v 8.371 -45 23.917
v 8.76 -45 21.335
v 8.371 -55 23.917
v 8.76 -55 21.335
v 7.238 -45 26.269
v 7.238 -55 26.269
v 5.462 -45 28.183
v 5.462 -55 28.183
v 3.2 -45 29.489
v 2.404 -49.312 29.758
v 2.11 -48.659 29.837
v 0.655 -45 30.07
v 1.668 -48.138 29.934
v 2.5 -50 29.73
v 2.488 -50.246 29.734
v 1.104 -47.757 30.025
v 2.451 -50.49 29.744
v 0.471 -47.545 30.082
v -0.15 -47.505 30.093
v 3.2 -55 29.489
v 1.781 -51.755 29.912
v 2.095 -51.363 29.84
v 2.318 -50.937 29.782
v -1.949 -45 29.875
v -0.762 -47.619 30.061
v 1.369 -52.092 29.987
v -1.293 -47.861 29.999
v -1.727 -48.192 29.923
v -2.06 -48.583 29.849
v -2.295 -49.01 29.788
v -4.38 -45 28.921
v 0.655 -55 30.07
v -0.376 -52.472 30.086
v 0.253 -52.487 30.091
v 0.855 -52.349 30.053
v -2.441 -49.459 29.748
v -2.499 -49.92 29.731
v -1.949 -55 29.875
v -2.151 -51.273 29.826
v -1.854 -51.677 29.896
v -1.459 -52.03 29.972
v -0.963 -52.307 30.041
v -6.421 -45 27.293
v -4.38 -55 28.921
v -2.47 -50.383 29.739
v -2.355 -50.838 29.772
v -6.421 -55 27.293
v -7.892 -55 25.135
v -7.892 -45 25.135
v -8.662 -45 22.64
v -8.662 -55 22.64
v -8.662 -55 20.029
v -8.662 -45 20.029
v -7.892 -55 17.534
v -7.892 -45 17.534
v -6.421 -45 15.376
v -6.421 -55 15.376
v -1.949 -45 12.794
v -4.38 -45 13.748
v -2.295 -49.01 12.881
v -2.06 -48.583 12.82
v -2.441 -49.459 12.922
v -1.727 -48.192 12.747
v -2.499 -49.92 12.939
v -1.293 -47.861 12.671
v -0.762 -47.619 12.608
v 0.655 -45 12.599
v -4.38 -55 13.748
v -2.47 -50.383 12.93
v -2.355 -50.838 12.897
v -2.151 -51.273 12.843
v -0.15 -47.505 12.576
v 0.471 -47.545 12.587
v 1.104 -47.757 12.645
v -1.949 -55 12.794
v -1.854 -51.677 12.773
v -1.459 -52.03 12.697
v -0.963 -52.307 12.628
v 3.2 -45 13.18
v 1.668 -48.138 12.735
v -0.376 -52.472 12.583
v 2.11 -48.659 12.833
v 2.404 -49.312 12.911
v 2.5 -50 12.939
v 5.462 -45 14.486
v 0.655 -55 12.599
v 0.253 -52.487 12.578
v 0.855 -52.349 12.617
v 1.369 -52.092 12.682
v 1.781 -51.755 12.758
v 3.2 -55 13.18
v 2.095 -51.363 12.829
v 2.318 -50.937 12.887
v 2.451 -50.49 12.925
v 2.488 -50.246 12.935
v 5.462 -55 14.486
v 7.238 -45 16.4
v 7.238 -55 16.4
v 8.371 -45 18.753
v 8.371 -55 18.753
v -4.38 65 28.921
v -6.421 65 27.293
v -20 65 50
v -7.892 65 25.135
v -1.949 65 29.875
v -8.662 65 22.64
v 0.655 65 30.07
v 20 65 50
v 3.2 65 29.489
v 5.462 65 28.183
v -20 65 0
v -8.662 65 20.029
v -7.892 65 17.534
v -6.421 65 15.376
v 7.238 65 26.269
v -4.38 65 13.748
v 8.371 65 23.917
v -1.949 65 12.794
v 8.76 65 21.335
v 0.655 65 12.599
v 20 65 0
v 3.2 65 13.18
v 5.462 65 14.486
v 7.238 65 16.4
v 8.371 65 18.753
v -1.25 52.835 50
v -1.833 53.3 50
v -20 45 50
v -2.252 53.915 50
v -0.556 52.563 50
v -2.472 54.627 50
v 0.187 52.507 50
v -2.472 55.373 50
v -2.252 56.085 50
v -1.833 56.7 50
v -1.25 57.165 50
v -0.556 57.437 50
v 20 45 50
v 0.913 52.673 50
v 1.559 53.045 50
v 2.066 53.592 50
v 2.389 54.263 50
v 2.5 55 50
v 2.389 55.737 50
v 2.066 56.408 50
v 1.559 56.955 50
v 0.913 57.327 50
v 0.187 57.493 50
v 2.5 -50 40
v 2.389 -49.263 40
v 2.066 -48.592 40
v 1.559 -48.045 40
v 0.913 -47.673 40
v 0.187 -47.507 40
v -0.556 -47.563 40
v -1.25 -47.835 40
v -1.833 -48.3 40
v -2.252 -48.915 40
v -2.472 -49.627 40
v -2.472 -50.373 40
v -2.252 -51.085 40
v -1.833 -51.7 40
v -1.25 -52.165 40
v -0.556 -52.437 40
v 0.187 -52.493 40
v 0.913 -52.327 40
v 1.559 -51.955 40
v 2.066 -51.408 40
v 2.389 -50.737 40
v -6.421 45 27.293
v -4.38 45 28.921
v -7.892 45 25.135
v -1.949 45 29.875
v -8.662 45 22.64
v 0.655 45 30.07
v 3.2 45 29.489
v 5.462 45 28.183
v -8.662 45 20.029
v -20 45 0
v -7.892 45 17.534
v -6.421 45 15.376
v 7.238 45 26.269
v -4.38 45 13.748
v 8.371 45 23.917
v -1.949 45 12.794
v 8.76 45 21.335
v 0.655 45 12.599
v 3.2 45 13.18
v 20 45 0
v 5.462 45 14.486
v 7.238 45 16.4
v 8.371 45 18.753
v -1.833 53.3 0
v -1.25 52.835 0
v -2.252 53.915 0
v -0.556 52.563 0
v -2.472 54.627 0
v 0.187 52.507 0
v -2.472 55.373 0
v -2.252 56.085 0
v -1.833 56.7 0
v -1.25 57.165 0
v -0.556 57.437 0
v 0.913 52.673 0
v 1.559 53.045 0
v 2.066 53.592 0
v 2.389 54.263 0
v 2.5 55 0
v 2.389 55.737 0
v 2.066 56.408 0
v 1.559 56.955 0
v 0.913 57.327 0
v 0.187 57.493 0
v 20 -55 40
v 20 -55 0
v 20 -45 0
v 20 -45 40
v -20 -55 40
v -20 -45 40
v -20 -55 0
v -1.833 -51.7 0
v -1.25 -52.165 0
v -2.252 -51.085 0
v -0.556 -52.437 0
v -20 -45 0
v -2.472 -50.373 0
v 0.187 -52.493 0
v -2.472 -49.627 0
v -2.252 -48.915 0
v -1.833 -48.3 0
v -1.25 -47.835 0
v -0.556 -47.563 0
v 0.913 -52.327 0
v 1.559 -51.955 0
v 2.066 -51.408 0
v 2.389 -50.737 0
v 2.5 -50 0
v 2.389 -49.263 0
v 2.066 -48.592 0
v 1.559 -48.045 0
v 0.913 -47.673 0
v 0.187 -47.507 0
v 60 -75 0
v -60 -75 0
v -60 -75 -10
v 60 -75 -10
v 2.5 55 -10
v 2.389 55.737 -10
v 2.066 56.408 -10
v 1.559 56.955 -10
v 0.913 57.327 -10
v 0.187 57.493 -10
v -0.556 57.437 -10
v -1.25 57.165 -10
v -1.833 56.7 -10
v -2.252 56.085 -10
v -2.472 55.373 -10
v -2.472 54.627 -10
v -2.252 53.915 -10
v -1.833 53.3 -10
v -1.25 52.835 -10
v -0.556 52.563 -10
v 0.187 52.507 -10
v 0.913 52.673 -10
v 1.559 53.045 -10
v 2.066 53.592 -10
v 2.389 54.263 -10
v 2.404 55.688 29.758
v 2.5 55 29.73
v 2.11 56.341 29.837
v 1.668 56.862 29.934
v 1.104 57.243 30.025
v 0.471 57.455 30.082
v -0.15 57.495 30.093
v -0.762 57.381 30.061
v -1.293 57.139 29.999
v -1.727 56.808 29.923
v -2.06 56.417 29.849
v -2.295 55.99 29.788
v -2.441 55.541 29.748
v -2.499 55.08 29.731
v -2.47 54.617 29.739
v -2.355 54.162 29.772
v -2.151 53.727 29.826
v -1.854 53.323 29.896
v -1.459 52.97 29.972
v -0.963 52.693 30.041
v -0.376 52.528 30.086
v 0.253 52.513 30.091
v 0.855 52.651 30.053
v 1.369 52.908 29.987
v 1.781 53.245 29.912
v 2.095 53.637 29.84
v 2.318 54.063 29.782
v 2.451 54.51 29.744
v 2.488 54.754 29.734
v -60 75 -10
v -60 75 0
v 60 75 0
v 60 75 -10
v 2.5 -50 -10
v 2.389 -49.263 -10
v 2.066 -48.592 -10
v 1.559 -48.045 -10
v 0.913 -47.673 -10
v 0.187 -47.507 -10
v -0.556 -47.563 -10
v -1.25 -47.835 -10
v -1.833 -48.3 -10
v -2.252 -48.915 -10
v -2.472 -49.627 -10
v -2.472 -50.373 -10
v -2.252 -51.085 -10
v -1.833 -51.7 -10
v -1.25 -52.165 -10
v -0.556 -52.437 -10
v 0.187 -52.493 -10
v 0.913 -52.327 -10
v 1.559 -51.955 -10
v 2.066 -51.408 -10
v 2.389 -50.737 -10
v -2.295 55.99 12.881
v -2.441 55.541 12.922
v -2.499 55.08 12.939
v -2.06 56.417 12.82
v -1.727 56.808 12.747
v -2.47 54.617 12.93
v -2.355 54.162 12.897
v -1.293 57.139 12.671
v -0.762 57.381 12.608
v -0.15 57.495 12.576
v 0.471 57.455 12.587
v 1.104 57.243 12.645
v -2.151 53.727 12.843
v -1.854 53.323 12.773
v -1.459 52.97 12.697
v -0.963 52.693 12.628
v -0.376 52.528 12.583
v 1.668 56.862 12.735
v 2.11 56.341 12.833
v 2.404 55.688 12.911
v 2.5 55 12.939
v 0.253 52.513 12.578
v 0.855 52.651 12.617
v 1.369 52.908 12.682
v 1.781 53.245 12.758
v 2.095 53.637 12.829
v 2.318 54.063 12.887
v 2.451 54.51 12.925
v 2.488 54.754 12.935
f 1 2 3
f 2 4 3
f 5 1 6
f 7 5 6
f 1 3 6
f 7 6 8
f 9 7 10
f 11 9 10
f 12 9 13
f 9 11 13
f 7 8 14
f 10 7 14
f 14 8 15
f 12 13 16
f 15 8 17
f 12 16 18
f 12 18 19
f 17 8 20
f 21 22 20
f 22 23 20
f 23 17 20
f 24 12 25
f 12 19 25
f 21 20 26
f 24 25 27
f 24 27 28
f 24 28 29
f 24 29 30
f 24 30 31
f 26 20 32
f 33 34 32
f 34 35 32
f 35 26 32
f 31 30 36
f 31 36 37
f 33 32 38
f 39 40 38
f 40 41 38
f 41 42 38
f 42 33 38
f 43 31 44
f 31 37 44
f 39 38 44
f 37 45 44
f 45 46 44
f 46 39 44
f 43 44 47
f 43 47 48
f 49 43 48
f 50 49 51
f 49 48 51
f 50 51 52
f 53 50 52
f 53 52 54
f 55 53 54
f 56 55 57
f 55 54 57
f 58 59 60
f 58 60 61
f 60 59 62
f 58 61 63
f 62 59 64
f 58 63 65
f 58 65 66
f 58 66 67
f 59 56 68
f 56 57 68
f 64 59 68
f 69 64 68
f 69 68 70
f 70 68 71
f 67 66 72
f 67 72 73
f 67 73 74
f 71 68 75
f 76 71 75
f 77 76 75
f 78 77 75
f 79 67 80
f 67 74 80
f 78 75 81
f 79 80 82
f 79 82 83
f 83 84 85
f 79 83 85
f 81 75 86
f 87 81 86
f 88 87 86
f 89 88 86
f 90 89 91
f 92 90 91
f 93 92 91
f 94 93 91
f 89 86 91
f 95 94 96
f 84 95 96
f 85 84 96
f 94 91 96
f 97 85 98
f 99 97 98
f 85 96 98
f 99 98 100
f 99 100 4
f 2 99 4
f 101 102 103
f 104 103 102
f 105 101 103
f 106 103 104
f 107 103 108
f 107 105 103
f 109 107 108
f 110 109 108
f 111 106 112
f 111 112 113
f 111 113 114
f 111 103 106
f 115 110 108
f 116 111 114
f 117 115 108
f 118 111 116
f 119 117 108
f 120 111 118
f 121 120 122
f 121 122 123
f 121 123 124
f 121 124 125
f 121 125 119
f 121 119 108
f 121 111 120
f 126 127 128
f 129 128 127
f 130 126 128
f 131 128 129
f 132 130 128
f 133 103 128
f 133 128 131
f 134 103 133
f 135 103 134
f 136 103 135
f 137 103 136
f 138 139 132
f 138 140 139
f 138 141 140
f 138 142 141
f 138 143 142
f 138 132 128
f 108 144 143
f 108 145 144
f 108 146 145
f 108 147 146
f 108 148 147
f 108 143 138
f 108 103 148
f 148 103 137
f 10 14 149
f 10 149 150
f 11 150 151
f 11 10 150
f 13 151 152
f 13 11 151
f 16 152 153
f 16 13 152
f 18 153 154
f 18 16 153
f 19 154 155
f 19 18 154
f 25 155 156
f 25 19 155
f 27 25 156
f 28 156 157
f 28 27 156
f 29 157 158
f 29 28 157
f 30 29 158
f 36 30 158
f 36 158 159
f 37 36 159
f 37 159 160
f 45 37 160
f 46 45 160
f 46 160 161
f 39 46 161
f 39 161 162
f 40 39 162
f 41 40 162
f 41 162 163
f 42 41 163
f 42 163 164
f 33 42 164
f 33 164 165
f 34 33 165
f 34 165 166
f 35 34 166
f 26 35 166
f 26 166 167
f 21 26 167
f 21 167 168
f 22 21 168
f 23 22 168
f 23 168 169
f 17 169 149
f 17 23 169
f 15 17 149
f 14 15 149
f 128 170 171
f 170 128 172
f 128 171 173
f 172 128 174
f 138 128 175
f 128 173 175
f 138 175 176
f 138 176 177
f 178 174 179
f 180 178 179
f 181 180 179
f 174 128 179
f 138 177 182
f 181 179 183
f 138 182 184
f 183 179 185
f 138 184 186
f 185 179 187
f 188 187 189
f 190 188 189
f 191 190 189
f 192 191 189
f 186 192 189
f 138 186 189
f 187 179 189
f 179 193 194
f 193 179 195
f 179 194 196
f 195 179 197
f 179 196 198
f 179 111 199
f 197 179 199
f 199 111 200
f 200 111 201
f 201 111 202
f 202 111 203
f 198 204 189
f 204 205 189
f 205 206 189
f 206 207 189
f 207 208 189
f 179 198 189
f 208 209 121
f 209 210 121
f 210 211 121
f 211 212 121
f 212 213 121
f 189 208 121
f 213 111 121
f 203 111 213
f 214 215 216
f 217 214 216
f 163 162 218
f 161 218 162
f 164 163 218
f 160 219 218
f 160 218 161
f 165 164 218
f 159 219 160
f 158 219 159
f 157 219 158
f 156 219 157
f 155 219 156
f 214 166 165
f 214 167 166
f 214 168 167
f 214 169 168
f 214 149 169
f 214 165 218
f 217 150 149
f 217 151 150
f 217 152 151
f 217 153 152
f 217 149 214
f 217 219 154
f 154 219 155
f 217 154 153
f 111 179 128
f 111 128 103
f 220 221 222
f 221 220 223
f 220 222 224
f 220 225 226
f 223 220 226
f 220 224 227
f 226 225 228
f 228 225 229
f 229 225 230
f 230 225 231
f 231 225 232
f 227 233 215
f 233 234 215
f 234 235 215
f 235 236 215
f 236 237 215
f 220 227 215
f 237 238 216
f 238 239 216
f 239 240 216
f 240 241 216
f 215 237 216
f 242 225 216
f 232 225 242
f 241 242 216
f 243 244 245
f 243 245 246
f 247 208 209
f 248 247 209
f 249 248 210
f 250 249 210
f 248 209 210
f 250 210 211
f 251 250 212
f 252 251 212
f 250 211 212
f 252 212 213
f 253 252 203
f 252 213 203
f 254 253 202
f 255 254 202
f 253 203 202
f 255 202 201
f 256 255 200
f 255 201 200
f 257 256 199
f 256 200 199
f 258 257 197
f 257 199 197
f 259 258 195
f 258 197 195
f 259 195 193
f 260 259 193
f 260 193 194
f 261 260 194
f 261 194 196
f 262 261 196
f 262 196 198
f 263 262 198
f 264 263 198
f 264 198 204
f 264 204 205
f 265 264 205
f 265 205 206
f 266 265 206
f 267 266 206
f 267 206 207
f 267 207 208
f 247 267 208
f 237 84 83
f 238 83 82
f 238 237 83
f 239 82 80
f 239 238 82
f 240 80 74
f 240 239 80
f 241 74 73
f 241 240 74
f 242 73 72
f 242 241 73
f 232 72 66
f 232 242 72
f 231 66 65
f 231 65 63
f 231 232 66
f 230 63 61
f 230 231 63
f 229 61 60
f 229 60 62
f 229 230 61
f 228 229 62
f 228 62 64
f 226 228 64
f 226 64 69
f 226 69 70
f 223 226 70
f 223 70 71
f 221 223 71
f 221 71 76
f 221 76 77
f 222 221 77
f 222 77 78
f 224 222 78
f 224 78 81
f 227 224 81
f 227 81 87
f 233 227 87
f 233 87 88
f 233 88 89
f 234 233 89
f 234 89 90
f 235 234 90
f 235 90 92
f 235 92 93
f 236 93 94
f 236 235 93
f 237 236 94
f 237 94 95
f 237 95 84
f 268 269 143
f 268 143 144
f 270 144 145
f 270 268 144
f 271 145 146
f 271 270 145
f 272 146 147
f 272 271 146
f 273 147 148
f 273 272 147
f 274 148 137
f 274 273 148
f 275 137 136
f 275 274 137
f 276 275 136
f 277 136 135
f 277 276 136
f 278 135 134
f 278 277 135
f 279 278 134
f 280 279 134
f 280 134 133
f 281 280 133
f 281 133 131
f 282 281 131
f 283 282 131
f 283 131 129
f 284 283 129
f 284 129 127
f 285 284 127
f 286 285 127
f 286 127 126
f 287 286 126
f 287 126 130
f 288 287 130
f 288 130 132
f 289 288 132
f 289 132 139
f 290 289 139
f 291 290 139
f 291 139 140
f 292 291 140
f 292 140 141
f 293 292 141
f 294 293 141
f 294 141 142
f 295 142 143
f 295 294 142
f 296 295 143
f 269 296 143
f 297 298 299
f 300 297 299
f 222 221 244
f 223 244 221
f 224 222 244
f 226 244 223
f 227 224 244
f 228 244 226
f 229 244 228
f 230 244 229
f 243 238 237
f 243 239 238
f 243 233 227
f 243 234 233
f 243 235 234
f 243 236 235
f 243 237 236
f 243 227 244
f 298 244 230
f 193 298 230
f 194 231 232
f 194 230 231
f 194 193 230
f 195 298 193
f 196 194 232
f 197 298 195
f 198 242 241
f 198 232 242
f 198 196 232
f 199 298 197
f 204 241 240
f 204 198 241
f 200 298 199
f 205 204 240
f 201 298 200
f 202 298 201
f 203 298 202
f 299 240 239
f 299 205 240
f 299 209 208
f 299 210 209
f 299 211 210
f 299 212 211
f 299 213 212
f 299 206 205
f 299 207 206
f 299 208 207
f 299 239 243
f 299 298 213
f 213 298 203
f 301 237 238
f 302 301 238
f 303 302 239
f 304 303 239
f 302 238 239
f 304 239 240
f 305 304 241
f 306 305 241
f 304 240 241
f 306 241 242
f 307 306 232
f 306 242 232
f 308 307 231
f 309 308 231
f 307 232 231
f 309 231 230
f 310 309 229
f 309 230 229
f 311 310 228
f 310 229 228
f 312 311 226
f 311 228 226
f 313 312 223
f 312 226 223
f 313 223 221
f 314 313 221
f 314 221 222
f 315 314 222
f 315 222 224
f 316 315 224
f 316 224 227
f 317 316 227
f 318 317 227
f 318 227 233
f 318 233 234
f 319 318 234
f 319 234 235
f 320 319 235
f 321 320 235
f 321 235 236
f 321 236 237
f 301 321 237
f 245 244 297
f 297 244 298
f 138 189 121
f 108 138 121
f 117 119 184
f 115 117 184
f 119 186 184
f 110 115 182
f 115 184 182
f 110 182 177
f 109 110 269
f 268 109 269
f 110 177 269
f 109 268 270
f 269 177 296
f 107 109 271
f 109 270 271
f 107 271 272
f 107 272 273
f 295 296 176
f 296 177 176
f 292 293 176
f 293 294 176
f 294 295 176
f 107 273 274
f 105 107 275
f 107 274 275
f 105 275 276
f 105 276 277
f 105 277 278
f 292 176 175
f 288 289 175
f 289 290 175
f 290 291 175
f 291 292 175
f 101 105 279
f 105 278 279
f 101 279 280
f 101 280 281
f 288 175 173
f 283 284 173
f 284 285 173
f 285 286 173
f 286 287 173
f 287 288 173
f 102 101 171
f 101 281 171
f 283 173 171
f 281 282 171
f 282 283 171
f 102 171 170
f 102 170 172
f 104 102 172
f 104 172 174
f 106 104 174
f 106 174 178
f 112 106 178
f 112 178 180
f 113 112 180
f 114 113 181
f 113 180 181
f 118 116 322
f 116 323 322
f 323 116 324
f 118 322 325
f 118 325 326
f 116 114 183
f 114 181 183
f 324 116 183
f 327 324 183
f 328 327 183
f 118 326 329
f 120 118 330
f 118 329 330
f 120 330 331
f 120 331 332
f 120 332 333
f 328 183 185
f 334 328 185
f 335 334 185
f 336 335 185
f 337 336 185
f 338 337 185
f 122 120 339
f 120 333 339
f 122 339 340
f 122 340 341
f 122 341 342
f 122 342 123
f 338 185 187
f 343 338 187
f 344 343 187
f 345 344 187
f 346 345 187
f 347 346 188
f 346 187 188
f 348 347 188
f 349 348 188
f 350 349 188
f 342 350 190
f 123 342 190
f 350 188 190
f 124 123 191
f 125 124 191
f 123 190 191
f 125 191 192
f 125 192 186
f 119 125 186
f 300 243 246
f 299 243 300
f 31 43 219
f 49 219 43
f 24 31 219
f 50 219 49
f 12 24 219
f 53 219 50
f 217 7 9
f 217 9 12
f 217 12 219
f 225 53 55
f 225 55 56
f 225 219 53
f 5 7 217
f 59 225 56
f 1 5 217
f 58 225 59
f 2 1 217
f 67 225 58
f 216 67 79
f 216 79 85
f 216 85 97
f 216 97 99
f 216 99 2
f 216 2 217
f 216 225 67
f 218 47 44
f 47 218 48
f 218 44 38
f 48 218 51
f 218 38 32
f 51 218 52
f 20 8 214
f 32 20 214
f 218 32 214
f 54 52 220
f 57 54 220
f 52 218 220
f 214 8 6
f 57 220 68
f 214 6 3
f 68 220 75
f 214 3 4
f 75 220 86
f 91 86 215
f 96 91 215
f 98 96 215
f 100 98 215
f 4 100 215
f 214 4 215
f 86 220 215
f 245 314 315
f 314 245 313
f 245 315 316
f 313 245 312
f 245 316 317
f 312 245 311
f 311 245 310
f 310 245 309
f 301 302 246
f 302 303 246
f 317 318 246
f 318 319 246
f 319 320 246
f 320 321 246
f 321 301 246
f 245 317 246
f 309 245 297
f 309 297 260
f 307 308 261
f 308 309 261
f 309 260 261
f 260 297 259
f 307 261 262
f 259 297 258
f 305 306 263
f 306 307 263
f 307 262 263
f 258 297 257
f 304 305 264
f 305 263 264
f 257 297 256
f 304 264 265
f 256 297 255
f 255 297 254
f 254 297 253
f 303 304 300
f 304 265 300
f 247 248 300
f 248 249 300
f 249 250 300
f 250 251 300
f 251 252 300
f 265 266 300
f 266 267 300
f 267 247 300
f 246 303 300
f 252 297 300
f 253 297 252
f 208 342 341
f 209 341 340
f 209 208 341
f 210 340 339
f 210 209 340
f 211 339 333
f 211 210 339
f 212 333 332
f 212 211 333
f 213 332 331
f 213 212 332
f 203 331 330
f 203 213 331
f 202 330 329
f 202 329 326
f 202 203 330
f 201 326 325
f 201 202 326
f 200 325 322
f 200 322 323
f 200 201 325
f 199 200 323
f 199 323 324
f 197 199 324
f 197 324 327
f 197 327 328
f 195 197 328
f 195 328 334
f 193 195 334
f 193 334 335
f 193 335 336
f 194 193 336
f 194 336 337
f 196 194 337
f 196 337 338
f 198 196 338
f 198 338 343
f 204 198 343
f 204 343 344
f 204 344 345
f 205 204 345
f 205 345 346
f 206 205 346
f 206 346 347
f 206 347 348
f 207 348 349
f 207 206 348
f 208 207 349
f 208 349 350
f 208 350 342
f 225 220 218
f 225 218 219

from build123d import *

# Parameters (mm, degrees)
F0_W     = 120
F0_H     = 150
F0_W_2   = 40
F0_H_2   = 10
F0_H_3   = 20
F0_R     = 2.5
F1_DEPTH = 10
F2_DEPTH = 50
F3_DEPTH = 25
F4_DEPTH = 25
F5_DEPTH = 40
F6_R     = 8.7598714534
F7_DEPTH = 80
F8_DEPTH = 68.3


with BuildPart() as f1:
    # F0 (on Top) → F1 (new body)
    with BuildSketch(Plane.XY):
        Rectangle(F0_W, F0_H)
        with Locations((0, -50)):
            Rectangle(F0_W_2, F0_H_2, mode=Mode.SUBTRACT)
        with Locations((0, 55)):
            Rectangle(F0_W_2, F0_H_3, mode=Mode.SUBTRACT)
        with Locations((0, 55)):
            Rectangle(F0_W_2, F0_H_3)
        with Locations((0, 55)):
            Circle(F0_R, mode=Mode.SUBTRACT)
        with Locations((0, -50)):
            Rectangle(F0_W_2, F0_H_2)
        with Locations((0, -50)):
            Circle(F0_R, mode=Mode.SUBTRACT)
        with Locations((0, 55)):
            Circle(F0_R)
        with Locations((0, -50)):
            Circle(F0_R)
    extrude(amount=-F1_DEPTH)

    # F0 (on Top) → F3 (cut)
    with BuildSketch(Plane.XY):
        with Locations((0, 55)):
            Circle(F0_R)
    extrude(amount=-F3_DEPTH, mode=Mode.SUBTRACT)

    # F0 (on Top) → F4 (cut)
    with BuildSketch(Plane.XY):
        with Locations((0, -50)):
            Circle(F0_R)
    extrude(amount=-F4_DEPTH, mode=Mode.SUBTRACT)

    # F6 (on Front) → F8 (cut)
    with BuildSketch(Plane.XZ):
        with Locations((0, 21.3346462697)):
            Circle(F6_R)
    extrude(amount=F8_DEPTH, mode=Mode.SUBTRACT)


with BuildPart() as f2:
    # F0 (on Top) → F2 (new body)
    with BuildSketch(Plane.XY):
        with Locations((0, 55)):
            Rectangle(F0_W_2, F0_H_3)
        with Locations((0, 55)):
            Circle(F0_R, mode=Mode.SUBTRACT)
    extrude(amount=F2_DEPTH)


with BuildPart() as f5:
    # F0 (on Top) → F5 (new body)
    with BuildSketch(Plane.XY):
        with Locations((0, -50)):
            Rectangle(F0_W_2, F0_H_2)
        with Locations((0, -50)):
            Circle(F0_R, mode=Mode.SUBTRACT)
    extrude(amount=F5_DEPTH)


with BuildPart() as f7_tool:
    # F6 (on Front) → F7 (new body, symmetric)
    with BuildSketch(Plane.XZ):
        with Locations((0, 21.3346462697)):
            Circle(F6_R)
    extrude(amount=F7_DEPTH, both=True)


with BuildPart() as f2_1:
    add(f2.part)

    # F7: cut by f7_tool
    add(f7_tool.part, mode=Mode.SUBTRACT)


with BuildPart() as f5_1:
    add(f5.part)

    # F7: cut by f7_tool
    add(f7_tool.part, mode=Mode.SUBTRACT)


solid = Compound([f1.part, f2_1.part, f5_1.part])
